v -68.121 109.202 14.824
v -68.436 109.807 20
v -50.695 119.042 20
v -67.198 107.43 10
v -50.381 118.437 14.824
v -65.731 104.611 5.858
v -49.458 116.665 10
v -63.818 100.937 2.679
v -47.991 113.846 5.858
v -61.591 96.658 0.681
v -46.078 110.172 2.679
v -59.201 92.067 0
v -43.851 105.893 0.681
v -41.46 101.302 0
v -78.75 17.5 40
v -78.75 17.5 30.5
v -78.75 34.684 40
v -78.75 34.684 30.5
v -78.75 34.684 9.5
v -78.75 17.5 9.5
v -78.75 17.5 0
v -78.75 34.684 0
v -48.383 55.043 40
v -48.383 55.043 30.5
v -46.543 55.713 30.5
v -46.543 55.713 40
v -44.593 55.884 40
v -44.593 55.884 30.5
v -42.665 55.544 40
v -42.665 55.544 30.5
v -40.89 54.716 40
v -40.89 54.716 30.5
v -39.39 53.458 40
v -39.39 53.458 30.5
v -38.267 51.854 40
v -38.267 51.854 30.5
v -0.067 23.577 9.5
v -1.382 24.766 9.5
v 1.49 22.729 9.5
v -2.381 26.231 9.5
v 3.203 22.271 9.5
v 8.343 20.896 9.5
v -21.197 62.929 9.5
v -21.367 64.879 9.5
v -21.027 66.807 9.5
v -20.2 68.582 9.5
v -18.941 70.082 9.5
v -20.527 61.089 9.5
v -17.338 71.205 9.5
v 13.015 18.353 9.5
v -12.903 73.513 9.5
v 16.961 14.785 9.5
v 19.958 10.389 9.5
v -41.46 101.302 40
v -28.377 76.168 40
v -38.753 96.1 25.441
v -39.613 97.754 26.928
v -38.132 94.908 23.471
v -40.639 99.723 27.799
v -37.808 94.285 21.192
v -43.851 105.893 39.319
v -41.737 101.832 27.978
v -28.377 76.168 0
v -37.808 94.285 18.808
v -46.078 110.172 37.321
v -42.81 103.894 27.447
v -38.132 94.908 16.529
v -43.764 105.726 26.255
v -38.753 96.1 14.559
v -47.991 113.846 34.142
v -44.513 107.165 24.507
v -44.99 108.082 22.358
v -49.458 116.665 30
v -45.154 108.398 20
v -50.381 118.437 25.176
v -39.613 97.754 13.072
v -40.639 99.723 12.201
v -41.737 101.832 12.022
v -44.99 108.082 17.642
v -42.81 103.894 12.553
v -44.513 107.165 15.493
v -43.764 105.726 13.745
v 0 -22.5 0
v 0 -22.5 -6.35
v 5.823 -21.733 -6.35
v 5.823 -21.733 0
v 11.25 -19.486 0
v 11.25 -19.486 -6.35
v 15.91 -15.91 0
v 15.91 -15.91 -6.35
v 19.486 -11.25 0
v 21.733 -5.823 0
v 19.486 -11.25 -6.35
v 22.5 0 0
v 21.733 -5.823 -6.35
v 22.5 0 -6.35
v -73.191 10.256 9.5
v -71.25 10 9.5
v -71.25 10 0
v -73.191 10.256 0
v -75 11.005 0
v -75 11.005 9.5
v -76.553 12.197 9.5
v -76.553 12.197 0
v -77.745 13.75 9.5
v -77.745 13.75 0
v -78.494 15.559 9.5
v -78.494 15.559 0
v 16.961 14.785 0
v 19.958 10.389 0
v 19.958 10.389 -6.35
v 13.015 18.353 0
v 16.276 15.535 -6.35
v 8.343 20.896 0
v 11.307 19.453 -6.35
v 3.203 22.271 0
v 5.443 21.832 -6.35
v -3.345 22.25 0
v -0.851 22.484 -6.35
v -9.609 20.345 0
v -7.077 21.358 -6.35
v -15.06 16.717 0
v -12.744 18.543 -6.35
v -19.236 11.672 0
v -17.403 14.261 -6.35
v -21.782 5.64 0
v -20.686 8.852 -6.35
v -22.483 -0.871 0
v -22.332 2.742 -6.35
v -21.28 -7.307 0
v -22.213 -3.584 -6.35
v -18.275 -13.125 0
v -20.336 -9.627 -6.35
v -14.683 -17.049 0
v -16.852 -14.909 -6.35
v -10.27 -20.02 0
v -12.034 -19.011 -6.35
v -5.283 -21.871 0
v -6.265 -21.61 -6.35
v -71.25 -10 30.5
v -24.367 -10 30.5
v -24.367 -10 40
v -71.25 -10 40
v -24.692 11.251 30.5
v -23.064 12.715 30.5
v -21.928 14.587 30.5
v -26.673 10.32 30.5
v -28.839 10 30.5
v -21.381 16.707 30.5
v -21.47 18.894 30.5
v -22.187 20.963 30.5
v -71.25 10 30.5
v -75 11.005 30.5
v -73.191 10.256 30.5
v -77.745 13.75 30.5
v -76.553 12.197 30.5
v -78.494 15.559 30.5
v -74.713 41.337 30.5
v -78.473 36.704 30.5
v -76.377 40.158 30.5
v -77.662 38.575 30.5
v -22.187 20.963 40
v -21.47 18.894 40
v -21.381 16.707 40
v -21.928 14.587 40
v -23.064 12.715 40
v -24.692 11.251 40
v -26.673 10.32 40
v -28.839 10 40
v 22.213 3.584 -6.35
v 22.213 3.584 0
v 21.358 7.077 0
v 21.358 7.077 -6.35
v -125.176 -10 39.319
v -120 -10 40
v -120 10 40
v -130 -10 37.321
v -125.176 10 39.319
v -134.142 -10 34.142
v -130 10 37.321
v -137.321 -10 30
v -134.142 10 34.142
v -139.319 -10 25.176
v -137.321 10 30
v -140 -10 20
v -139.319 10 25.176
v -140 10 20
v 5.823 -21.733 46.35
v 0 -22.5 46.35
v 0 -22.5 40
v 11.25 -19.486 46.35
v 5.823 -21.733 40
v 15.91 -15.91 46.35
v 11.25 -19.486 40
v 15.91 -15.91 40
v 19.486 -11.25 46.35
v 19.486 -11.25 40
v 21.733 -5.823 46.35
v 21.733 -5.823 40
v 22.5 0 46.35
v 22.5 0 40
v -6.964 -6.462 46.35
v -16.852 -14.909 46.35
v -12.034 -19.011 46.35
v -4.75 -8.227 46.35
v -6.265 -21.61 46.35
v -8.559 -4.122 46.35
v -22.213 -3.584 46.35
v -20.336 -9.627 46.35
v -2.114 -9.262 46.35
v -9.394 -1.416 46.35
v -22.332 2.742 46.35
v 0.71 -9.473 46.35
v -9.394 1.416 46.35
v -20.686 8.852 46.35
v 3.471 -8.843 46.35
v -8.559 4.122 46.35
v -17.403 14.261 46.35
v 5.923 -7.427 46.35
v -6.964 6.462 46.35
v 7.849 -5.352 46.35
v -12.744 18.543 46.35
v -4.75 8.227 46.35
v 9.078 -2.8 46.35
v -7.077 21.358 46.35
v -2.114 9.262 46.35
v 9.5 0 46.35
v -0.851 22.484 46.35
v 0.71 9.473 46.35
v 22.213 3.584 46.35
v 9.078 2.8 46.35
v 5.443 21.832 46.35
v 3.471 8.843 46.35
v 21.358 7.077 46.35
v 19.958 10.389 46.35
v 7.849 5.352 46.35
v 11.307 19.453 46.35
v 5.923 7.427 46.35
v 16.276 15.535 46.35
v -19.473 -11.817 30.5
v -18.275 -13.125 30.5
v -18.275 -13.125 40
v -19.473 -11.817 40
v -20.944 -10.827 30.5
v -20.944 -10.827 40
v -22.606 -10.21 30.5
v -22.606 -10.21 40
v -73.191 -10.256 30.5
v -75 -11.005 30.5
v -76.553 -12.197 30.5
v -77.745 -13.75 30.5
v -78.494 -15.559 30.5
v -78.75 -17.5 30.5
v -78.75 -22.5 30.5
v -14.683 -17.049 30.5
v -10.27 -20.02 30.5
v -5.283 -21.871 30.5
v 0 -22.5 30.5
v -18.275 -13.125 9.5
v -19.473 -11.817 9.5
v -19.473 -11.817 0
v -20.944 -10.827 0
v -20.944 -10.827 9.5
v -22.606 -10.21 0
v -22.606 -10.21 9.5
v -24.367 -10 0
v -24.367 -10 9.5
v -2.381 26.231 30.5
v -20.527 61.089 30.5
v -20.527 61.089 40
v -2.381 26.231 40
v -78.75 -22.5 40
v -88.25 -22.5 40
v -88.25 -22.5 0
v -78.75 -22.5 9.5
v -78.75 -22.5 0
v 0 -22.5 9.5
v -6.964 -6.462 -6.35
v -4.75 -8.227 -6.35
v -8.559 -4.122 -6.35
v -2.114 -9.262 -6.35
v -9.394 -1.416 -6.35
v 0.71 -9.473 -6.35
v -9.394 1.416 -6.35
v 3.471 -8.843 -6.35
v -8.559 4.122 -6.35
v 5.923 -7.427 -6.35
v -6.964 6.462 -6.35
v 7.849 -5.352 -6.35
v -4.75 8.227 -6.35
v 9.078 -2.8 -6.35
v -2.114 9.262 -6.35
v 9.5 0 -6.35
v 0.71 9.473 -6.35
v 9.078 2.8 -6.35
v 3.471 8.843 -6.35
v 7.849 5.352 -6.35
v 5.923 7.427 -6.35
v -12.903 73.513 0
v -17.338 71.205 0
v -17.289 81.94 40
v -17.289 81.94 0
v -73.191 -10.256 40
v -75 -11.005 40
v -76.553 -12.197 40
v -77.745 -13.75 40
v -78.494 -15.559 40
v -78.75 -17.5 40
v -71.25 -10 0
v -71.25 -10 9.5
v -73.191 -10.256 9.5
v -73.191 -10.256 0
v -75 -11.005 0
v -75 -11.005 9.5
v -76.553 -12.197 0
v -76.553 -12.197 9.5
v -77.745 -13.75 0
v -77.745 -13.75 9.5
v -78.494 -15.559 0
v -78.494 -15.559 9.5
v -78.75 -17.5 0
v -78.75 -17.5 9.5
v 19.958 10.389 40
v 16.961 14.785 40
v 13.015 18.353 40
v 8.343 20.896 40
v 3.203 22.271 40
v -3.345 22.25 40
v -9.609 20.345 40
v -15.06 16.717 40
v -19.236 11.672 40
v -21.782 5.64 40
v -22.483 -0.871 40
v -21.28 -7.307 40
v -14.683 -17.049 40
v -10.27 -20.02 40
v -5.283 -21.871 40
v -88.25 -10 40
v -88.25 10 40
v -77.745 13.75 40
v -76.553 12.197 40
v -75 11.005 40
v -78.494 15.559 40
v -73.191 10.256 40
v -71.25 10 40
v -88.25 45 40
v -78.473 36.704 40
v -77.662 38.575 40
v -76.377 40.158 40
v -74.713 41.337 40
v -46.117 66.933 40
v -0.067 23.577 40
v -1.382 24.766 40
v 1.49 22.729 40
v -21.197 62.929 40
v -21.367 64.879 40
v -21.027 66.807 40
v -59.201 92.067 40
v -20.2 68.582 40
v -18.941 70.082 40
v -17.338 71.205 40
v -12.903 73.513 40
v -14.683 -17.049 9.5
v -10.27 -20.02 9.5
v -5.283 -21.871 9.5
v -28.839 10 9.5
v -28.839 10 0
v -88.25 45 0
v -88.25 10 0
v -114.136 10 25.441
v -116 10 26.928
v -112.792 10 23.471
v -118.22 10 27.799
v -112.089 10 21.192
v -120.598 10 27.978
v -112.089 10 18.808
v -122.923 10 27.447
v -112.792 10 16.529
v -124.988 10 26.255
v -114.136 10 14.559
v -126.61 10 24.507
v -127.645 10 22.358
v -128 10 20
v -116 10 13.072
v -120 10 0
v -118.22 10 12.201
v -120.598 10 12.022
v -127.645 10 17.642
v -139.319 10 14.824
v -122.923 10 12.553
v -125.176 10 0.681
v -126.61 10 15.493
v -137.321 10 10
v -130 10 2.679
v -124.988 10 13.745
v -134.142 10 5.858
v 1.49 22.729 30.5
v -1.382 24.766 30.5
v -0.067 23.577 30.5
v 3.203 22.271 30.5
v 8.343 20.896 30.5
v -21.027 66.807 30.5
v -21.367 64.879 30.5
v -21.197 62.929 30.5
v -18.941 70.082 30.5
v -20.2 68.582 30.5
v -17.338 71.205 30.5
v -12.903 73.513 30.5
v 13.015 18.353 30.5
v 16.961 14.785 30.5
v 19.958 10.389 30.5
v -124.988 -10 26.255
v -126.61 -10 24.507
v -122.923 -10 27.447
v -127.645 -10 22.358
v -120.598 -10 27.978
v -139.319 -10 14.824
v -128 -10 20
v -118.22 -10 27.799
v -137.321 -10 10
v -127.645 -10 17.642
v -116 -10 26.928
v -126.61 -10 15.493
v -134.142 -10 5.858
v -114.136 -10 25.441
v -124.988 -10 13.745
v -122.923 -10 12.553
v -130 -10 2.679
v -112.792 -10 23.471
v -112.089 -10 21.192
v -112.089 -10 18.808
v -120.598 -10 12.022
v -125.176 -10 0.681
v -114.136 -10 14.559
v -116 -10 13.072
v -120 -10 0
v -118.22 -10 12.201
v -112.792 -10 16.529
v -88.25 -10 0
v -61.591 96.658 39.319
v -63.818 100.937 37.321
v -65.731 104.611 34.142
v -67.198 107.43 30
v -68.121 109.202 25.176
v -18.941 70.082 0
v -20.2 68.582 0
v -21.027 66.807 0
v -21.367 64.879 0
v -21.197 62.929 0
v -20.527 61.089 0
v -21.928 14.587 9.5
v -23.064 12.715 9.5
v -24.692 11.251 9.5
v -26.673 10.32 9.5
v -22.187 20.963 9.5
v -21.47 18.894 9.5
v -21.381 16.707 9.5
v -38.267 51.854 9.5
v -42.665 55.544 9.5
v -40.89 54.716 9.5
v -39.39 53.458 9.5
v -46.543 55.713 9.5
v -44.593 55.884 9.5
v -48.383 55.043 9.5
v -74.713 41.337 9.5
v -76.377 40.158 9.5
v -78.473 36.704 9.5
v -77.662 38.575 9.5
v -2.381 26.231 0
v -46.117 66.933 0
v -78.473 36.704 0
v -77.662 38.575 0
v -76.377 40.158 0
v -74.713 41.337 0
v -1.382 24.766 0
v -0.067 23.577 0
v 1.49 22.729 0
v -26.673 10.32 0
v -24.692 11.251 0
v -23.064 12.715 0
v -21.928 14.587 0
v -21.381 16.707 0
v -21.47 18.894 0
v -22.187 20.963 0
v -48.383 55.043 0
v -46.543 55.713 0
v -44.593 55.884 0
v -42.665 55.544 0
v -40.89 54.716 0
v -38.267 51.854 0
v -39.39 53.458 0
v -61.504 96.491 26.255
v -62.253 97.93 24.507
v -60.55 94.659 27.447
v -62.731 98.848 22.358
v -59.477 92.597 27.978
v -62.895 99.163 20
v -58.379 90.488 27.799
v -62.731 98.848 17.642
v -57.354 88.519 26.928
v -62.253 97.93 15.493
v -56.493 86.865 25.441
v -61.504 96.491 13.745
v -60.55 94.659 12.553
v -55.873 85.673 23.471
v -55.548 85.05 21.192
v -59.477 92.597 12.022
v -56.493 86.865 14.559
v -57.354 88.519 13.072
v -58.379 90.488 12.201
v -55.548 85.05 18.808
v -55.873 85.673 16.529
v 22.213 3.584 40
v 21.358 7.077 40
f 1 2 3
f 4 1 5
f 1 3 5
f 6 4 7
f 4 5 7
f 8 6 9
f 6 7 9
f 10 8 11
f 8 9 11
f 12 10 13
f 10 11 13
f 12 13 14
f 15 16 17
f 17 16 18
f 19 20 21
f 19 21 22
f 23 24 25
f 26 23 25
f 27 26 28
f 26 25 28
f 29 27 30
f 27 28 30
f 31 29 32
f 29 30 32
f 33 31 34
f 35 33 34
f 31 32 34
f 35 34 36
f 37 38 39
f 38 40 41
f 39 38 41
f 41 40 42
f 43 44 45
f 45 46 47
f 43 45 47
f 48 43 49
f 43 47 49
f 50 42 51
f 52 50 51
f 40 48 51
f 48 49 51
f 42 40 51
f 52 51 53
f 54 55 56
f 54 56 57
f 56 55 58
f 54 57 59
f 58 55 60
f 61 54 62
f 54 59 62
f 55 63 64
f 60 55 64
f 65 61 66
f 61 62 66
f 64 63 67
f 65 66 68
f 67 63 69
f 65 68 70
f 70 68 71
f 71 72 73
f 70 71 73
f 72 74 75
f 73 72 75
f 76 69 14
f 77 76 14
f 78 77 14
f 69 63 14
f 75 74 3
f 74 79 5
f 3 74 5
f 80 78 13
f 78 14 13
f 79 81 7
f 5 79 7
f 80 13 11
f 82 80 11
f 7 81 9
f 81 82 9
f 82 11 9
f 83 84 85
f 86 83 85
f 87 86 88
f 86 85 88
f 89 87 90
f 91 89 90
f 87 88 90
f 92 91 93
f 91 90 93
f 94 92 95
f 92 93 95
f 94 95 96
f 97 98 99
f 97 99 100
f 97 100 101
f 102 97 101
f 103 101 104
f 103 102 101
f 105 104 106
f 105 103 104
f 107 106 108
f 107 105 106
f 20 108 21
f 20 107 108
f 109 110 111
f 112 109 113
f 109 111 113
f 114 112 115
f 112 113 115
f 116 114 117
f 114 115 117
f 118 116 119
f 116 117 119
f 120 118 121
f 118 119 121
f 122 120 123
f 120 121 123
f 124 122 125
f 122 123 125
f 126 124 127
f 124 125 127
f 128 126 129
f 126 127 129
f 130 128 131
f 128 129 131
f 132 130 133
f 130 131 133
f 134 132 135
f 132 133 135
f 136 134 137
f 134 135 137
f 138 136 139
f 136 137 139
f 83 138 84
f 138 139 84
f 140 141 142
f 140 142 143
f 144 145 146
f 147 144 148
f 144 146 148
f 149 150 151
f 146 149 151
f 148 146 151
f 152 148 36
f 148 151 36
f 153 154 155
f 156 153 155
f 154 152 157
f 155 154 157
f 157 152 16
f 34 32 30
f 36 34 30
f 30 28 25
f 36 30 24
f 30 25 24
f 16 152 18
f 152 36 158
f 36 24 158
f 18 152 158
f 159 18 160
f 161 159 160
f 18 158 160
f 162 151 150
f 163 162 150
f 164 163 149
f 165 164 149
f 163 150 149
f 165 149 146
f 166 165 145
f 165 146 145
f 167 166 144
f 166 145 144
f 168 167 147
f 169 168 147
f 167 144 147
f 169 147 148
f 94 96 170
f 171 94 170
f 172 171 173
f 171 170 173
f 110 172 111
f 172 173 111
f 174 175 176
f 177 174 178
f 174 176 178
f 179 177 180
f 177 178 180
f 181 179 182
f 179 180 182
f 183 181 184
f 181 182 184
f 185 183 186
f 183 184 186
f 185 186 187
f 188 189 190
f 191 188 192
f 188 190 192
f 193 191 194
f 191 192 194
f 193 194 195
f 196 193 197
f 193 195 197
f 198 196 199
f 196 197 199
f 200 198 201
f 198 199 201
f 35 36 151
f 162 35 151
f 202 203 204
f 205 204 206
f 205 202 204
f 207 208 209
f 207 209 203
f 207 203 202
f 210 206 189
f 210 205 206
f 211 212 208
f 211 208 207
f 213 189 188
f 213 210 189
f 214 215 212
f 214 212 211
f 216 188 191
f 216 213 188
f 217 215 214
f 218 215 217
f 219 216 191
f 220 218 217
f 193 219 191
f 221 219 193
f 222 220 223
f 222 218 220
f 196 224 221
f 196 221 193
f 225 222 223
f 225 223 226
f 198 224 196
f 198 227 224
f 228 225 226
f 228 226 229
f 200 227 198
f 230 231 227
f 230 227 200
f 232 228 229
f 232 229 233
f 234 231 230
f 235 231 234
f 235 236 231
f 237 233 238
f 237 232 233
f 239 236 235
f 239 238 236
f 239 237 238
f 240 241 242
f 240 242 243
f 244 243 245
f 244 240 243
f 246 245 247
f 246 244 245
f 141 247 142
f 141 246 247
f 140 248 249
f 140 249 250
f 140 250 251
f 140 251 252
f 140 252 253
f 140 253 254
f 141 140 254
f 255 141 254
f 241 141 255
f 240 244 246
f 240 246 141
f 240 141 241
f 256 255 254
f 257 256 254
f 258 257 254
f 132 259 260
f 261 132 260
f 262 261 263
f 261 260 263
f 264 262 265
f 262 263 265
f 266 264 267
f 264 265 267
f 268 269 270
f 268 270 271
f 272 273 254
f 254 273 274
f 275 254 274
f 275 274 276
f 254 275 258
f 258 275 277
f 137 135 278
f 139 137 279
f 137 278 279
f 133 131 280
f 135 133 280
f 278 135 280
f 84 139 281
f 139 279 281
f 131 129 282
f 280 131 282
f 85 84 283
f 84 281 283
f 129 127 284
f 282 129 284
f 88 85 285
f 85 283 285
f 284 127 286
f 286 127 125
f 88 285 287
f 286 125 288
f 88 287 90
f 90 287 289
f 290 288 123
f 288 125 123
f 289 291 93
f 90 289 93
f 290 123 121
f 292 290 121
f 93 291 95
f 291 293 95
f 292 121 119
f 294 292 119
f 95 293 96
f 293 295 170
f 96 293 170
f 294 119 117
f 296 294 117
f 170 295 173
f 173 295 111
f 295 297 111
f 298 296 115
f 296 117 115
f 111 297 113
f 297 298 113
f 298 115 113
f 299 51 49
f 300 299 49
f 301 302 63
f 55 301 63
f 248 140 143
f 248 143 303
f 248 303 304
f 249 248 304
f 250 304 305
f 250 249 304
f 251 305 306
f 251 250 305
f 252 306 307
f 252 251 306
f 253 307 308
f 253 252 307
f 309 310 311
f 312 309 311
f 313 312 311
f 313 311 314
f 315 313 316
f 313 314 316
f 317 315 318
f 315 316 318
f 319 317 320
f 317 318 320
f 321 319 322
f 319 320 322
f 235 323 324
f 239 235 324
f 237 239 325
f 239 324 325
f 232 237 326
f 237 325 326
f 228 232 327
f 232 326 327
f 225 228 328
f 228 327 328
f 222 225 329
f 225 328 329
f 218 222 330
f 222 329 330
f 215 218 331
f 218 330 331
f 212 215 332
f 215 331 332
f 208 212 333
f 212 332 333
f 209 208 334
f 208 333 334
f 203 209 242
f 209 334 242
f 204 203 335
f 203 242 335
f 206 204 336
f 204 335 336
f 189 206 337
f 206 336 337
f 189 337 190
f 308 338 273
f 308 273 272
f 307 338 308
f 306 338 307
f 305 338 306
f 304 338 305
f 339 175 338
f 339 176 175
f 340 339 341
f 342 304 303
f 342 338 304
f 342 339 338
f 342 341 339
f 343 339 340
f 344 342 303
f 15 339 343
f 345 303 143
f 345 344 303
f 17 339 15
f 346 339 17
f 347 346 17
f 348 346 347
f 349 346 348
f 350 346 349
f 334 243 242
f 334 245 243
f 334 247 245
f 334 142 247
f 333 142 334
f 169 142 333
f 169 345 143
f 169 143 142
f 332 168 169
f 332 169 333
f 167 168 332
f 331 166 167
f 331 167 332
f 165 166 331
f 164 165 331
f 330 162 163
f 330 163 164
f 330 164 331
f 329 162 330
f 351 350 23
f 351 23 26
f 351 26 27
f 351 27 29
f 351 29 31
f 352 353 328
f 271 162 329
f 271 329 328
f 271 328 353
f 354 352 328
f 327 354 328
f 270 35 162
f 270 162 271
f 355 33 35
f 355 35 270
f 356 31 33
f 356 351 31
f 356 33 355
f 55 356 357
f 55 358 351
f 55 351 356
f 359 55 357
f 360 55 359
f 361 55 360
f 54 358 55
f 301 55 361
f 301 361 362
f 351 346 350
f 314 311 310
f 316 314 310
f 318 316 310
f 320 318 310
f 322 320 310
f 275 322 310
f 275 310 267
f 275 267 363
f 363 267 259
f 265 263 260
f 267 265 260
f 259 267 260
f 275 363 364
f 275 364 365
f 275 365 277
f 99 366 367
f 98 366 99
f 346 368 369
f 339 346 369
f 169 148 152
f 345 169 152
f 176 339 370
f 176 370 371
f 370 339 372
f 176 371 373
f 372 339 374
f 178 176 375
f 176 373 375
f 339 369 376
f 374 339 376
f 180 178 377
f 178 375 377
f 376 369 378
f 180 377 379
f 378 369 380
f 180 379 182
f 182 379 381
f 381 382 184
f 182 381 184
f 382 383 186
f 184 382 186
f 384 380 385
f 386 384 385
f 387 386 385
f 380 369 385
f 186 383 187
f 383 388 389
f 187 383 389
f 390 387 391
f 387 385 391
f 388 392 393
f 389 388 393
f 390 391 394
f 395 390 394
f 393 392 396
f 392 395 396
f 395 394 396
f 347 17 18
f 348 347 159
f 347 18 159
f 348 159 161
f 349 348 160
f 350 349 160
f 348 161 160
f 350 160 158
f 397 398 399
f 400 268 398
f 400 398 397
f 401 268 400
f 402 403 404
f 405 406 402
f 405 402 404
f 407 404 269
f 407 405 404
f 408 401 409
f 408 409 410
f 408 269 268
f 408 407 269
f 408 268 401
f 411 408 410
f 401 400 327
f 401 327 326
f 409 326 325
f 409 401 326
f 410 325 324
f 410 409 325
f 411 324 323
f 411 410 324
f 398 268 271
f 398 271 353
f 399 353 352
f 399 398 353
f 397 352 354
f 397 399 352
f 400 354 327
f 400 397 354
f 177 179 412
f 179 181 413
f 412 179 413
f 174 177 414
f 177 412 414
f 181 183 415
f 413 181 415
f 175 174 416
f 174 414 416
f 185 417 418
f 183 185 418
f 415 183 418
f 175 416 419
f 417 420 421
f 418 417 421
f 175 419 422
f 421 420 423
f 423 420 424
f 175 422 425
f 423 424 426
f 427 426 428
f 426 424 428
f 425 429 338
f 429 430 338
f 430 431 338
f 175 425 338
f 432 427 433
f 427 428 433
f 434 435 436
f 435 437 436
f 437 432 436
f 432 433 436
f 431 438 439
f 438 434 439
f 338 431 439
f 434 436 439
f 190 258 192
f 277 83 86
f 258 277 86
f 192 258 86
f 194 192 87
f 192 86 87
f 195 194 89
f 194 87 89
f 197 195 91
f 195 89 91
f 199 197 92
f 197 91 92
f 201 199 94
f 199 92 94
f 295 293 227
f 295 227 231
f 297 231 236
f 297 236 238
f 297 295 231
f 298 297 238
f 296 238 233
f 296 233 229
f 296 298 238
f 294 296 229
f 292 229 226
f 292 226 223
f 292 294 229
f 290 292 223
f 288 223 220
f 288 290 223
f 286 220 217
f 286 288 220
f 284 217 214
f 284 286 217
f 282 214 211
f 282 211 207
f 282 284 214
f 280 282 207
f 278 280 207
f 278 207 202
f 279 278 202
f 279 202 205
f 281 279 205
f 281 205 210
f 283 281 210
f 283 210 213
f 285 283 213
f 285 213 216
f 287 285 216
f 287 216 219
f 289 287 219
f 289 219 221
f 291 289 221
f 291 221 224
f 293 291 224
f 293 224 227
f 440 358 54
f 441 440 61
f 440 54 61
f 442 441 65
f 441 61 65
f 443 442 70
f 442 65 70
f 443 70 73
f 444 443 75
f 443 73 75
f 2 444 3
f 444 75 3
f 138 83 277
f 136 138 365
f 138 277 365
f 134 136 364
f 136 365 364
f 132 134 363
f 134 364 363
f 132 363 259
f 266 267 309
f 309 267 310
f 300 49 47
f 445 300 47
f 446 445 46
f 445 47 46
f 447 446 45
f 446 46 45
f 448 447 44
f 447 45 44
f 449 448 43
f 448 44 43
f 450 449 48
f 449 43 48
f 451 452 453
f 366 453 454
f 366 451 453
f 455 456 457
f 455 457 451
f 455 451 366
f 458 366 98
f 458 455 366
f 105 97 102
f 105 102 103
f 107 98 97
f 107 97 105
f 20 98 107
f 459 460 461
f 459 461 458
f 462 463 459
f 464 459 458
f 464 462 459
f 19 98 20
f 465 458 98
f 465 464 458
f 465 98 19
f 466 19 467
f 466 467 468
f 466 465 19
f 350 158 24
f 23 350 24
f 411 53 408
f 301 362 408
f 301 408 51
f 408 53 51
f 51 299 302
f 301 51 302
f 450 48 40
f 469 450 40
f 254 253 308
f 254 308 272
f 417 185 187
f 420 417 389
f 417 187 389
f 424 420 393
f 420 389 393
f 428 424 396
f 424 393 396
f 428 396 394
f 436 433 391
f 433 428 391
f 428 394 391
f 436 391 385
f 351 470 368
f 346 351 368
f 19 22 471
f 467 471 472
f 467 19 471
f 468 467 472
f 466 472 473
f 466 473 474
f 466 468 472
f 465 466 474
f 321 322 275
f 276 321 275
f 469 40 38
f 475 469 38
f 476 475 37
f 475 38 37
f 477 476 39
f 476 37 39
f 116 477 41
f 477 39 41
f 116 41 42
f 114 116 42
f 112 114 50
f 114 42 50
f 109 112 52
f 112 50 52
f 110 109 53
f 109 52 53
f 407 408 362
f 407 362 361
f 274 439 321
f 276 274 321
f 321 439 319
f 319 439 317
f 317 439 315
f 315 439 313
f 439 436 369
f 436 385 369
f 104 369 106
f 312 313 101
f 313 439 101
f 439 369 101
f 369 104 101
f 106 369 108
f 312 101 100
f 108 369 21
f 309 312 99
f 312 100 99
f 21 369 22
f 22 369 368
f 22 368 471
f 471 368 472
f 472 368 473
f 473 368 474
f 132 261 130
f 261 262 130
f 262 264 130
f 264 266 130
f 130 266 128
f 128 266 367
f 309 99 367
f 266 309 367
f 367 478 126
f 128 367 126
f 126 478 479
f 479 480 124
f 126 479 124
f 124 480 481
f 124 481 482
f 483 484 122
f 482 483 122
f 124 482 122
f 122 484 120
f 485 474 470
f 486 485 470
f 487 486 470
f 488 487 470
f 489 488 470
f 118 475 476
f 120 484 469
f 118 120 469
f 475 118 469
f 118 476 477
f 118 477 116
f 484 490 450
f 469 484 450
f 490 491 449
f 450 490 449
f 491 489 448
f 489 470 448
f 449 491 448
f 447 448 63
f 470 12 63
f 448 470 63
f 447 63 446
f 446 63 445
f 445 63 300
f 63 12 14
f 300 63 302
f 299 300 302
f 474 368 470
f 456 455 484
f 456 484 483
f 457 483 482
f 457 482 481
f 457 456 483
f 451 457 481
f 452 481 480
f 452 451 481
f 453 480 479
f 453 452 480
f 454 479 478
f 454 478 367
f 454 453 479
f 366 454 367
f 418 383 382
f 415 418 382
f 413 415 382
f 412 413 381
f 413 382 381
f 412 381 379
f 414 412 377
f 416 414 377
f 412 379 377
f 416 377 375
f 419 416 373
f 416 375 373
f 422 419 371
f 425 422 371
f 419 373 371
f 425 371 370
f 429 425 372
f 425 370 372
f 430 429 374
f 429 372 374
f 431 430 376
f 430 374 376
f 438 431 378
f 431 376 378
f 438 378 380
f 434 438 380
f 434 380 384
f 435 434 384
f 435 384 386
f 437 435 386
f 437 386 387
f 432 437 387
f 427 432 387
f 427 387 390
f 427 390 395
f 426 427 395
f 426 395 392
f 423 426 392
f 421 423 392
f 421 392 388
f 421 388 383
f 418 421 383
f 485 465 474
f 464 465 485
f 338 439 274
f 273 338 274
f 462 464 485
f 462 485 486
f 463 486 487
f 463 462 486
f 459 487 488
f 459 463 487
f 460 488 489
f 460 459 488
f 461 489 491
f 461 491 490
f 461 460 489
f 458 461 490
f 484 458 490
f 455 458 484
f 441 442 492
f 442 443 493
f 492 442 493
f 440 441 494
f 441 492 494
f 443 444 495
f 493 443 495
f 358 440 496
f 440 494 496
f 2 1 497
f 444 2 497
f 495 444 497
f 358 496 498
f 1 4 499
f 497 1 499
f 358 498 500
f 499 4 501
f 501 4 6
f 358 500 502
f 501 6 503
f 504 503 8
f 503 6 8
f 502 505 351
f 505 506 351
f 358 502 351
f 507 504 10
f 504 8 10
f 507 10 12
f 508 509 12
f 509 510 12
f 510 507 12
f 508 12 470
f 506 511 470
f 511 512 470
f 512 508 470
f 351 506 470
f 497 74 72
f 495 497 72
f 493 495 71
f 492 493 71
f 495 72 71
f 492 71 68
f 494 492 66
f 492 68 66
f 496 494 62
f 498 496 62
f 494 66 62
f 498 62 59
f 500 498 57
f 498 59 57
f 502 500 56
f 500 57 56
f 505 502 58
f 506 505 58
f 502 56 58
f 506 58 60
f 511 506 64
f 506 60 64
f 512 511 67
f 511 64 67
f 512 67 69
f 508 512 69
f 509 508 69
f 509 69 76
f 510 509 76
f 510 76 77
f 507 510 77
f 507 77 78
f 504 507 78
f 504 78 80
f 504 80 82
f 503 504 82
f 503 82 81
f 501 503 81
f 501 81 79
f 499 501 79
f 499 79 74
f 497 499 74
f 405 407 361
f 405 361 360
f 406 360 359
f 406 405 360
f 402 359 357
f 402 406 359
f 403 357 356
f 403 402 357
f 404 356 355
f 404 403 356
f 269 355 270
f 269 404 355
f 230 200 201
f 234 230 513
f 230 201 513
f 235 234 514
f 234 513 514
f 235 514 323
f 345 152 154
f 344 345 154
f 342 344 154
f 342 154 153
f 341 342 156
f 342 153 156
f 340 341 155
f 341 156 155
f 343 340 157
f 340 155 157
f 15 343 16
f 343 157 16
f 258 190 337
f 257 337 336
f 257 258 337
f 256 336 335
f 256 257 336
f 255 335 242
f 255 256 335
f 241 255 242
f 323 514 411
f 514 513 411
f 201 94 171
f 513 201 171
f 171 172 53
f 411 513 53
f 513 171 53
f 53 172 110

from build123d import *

# Parameters (mm, degrees)
ESQUISSE1_R             = 22.5
ESQUISSE1_R_2           = 9.5
BOSS_EXTRU_1_DEPTH      = 40
BOSS_EXTRU_2_DEPTH      = 6.35
BOSS_EXTRU_2_DEPTH_BACK = 46.35
ESQUISSE2_R             = 9.5
ESQUISSE3_R             = 8
ENL_V_MAT_EXTRU_1_DEPTH = 194.400037211
ESQUISSE4_R             = 8
ENL_V_MAT_EXTRU_2_DEPTH = 184.407892092
ENL_V_START             = -9.5
ENL_V_MAT_EXTRU_3_DEPTH = 9.5


with BuildPart() as part:
    # Esquisse1 → Boss.-Extru.1 (new body)
    # profile 1 of 2: a face of its own
    with BuildSketch(Plane.XY):
        with BuildLine():
            ThreePointArc((0, -22.5), (-19.23551709, 11.672398309), (19.957743747, 10.389343798))
            Line((19.957743747, 10.389343798), (-17.289116996, 81.93989757))
            Line((-17.289116996, 81.93989757), (-28.376752411, 76.168039905))
            Line((-28.376752411, 76.168039905), (-50.695462776, 119.041883612))
            Line((-50.695462776, 119.041883612), (-68.435679439, 109.806911348))
            Line((-68.435679439, 109.806911348), (-46.116969074, 66.93306764))
            Line((-46.116969074, 66.93306764), (-88.25, 45))
            Line((-88.25, 45), (-88.25, 10))
            Line((-88.25, 10), (-140, 10))
            Line((-140, 10), (-140, -10))
            Line((-140, -10), (-88.25, -10))
            Line((-88.25, -10), (-88.25, -22.5))
            Line((-88.25, -22.5), (0, -22.5))
        make_face()
    # profile 2 of 2: a face of its own
    with BuildSketch(Plane.XY):
        Circle(ESQUISSE1_R)
        Circle(ESQUISSE1_R_2, mode=Mode.SUBTRACT)
    extrude(amount=BOSS_EXTRU_1_DEPTH)

    # Esquisse2 → Boss.-Extru.2 (add, two sides: drawn at the far end of the back side and taken through both)
    with BuildSketch(Plane.XY.offset(40).offset(-BOSS_EXTRU_2_DEPTH_BACK)):
        with BuildLine():
            ThreePointArc((19.957743747, 10.389343798), (-19.23551709, 11.672398309), (0, -22.5))
            ThreePointArc((0, -22.5), (15.909902577, -15.909902577), (22.5, 0))
            ThreePointArc((22.5, 0), (21.855196571, 5.347932577), (19.957743747, 10.389343798))
        make_face()
        Circle(ESQUISSE2_R, mode=Mode.SUBTRACT)
    extrude(amount=BOSS_EXTRU_2_DEPTH + BOSS_EXTRU_2_DEPTH_BACK)

    # Esquisse3 → Enlèv. mat.-Extru.1 (cut, through all)
    with BuildSketch(Plane(origin=(8.870108332, 4.617486132, 0), x_dir=(0, 0, -1), z_dir=(0.8870108331782226, 0.4617486132350323, 0))):
        with BuildLine():
            ThreePointArc((-20, 129), (-5.857864376, 123.142135624), (0, 109))
            Line((0, 109), (0, 129))
            Line((0, 129), (-20, 129))
        make_face()
        with BuildLine():
            ThreePointArc((-40, 109), (-34.142135624, 123.142135624), (-20, 129))
            Line((-20, 129), (-40, 129))
            Line((-40, 129), (-40, 109))
        make_face()
        with Locations(Location((-20, 109, 0), (0, 0, 90))):
            Circle(ESQUISSE3_R)
    extrude(amount=-ENL_V_MAT_EXTRU_1_DEPTH, mode=Mode.SUBTRACT)

    # Esquisse4 → Enlèv. mat.-Extru.2 (cut, through all)
    with BuildSketch(Plane(origin=(0, 10, 0), x_dir=(1, 0, 0), z_dir=(0, 1, 0))):
        with Locations(Location((-120, -20, 0), (0, 0, 180))):
            Circle(ESQUISSE4_R)
        with BuildLine():
            ThreePointArc((-140, -20), (-134.142135624, -5.857864376), (-120, 0))
            Line((-120, 0), (-140, 0))
            Line((-140, 0), (-140, -20))
        make_face()
        with BuildLine():
            ThreePointArc((-120, -40), (-134.142135624, -34.142135624), (-140, -20))
            Line((-140, -20), (-140, -40))
            Line((-140, -40), (-120, -40))
        make_face()
    extrude(amount=-ENL_V_MAT_EXTRU_2_DEPTH, mode=Mode.SUBTRACT)

    # Esquisse5 → Enlèv. mat.-Extru.3 (cut)
    with BuildSketch(Plane.XY.offset(40).offset(ENL_V_START)):
        with BuildLine():
            ThreePointArc((-18.275239397, -13.125), (-20.943719878, -10.826826092), (-24.366985862, -10))
            Line((-24.366985862, -10), (-71.25, -10))
            ThreePointArc((-71.25, -10), (-76.553300859, -12.196699141), (-78.75, -17.5))
            Line((-78.75, -17.5), (-78.75, -22.5))
            Line((-78.75, -22.5), (0, -22.5))
            ThreePointArc((0, -22.5), (-10.269797953, -20.019521723), (-18.275239397, -13.125))
        make_face()
        with BuildLine():
            ThreePointArc((-2.381313599, 26.231266564), (-0.067221577, 23.576578352), (3.203450738, 22.270785872))
            ThreePointArc((3.203450738, 22.270785872), (13.01546768, 18.353408432), (19.957743747, 10.389343798))
            Line((19.957743747, 10.389343798), (-12.90250517, 73.513294655))
            Line((-12.90250517, 73.513294655), (-17.337559336, 71.204551589))
            ThreePointArc((-17.337559336, 71.204551589), (-21.027321868, 66.807263836), (-20.527025986, 61.08885574))
            Line((-20.527025986, 61.08885574), (-2.381313599, 26.231266564))
        make_face()
        with BuildLine():
            Line((-78.75, 17.5), (-78.75, 34.684146763))
            ThreePointArc((-78.75, 34.684146763), (-77.66183903, 38.574946199), (-74.713114599, 41.336728011))
            Line((-74.713114599, 41.336728011), (-48.382938497, 55.043350125))
            ThreePointArc((-48.382938497, 55.043350125), (-42.664530402, 55.543646007), (-38.267242649, 51.853883476))
            Line((-38.267242649, 51.853883476), (-22.186526206, 20.963114599))
            ThreePointArc((-22.186526206, 20.963114599), (-22.427268425, 13.609200564), (-28.839107455, 10))
            Line((-28.839107455, 10), (-71.25, 10))
            ThreePointArc((-71.25, 10), (-76.553300859, 12.196699141), (-78.75, 17.5))
        make_face()
    enl_v_mat_extru_3 = extrude(amount=ENL_V_MAT_EXTRU_3_DEPTH, mode=Mode.SUBTRACT)

    # Symétrie1: Enlèv. mat.-Extru.3 across plane
    add(enl_v_mat_extru_3.mirror(Plane(origin=(0, 0, 20), x_dir=(1, 0, 0), z_dir=(0, 0, -1))), mode=Mode.SUBTRACT)


solid = part.part
